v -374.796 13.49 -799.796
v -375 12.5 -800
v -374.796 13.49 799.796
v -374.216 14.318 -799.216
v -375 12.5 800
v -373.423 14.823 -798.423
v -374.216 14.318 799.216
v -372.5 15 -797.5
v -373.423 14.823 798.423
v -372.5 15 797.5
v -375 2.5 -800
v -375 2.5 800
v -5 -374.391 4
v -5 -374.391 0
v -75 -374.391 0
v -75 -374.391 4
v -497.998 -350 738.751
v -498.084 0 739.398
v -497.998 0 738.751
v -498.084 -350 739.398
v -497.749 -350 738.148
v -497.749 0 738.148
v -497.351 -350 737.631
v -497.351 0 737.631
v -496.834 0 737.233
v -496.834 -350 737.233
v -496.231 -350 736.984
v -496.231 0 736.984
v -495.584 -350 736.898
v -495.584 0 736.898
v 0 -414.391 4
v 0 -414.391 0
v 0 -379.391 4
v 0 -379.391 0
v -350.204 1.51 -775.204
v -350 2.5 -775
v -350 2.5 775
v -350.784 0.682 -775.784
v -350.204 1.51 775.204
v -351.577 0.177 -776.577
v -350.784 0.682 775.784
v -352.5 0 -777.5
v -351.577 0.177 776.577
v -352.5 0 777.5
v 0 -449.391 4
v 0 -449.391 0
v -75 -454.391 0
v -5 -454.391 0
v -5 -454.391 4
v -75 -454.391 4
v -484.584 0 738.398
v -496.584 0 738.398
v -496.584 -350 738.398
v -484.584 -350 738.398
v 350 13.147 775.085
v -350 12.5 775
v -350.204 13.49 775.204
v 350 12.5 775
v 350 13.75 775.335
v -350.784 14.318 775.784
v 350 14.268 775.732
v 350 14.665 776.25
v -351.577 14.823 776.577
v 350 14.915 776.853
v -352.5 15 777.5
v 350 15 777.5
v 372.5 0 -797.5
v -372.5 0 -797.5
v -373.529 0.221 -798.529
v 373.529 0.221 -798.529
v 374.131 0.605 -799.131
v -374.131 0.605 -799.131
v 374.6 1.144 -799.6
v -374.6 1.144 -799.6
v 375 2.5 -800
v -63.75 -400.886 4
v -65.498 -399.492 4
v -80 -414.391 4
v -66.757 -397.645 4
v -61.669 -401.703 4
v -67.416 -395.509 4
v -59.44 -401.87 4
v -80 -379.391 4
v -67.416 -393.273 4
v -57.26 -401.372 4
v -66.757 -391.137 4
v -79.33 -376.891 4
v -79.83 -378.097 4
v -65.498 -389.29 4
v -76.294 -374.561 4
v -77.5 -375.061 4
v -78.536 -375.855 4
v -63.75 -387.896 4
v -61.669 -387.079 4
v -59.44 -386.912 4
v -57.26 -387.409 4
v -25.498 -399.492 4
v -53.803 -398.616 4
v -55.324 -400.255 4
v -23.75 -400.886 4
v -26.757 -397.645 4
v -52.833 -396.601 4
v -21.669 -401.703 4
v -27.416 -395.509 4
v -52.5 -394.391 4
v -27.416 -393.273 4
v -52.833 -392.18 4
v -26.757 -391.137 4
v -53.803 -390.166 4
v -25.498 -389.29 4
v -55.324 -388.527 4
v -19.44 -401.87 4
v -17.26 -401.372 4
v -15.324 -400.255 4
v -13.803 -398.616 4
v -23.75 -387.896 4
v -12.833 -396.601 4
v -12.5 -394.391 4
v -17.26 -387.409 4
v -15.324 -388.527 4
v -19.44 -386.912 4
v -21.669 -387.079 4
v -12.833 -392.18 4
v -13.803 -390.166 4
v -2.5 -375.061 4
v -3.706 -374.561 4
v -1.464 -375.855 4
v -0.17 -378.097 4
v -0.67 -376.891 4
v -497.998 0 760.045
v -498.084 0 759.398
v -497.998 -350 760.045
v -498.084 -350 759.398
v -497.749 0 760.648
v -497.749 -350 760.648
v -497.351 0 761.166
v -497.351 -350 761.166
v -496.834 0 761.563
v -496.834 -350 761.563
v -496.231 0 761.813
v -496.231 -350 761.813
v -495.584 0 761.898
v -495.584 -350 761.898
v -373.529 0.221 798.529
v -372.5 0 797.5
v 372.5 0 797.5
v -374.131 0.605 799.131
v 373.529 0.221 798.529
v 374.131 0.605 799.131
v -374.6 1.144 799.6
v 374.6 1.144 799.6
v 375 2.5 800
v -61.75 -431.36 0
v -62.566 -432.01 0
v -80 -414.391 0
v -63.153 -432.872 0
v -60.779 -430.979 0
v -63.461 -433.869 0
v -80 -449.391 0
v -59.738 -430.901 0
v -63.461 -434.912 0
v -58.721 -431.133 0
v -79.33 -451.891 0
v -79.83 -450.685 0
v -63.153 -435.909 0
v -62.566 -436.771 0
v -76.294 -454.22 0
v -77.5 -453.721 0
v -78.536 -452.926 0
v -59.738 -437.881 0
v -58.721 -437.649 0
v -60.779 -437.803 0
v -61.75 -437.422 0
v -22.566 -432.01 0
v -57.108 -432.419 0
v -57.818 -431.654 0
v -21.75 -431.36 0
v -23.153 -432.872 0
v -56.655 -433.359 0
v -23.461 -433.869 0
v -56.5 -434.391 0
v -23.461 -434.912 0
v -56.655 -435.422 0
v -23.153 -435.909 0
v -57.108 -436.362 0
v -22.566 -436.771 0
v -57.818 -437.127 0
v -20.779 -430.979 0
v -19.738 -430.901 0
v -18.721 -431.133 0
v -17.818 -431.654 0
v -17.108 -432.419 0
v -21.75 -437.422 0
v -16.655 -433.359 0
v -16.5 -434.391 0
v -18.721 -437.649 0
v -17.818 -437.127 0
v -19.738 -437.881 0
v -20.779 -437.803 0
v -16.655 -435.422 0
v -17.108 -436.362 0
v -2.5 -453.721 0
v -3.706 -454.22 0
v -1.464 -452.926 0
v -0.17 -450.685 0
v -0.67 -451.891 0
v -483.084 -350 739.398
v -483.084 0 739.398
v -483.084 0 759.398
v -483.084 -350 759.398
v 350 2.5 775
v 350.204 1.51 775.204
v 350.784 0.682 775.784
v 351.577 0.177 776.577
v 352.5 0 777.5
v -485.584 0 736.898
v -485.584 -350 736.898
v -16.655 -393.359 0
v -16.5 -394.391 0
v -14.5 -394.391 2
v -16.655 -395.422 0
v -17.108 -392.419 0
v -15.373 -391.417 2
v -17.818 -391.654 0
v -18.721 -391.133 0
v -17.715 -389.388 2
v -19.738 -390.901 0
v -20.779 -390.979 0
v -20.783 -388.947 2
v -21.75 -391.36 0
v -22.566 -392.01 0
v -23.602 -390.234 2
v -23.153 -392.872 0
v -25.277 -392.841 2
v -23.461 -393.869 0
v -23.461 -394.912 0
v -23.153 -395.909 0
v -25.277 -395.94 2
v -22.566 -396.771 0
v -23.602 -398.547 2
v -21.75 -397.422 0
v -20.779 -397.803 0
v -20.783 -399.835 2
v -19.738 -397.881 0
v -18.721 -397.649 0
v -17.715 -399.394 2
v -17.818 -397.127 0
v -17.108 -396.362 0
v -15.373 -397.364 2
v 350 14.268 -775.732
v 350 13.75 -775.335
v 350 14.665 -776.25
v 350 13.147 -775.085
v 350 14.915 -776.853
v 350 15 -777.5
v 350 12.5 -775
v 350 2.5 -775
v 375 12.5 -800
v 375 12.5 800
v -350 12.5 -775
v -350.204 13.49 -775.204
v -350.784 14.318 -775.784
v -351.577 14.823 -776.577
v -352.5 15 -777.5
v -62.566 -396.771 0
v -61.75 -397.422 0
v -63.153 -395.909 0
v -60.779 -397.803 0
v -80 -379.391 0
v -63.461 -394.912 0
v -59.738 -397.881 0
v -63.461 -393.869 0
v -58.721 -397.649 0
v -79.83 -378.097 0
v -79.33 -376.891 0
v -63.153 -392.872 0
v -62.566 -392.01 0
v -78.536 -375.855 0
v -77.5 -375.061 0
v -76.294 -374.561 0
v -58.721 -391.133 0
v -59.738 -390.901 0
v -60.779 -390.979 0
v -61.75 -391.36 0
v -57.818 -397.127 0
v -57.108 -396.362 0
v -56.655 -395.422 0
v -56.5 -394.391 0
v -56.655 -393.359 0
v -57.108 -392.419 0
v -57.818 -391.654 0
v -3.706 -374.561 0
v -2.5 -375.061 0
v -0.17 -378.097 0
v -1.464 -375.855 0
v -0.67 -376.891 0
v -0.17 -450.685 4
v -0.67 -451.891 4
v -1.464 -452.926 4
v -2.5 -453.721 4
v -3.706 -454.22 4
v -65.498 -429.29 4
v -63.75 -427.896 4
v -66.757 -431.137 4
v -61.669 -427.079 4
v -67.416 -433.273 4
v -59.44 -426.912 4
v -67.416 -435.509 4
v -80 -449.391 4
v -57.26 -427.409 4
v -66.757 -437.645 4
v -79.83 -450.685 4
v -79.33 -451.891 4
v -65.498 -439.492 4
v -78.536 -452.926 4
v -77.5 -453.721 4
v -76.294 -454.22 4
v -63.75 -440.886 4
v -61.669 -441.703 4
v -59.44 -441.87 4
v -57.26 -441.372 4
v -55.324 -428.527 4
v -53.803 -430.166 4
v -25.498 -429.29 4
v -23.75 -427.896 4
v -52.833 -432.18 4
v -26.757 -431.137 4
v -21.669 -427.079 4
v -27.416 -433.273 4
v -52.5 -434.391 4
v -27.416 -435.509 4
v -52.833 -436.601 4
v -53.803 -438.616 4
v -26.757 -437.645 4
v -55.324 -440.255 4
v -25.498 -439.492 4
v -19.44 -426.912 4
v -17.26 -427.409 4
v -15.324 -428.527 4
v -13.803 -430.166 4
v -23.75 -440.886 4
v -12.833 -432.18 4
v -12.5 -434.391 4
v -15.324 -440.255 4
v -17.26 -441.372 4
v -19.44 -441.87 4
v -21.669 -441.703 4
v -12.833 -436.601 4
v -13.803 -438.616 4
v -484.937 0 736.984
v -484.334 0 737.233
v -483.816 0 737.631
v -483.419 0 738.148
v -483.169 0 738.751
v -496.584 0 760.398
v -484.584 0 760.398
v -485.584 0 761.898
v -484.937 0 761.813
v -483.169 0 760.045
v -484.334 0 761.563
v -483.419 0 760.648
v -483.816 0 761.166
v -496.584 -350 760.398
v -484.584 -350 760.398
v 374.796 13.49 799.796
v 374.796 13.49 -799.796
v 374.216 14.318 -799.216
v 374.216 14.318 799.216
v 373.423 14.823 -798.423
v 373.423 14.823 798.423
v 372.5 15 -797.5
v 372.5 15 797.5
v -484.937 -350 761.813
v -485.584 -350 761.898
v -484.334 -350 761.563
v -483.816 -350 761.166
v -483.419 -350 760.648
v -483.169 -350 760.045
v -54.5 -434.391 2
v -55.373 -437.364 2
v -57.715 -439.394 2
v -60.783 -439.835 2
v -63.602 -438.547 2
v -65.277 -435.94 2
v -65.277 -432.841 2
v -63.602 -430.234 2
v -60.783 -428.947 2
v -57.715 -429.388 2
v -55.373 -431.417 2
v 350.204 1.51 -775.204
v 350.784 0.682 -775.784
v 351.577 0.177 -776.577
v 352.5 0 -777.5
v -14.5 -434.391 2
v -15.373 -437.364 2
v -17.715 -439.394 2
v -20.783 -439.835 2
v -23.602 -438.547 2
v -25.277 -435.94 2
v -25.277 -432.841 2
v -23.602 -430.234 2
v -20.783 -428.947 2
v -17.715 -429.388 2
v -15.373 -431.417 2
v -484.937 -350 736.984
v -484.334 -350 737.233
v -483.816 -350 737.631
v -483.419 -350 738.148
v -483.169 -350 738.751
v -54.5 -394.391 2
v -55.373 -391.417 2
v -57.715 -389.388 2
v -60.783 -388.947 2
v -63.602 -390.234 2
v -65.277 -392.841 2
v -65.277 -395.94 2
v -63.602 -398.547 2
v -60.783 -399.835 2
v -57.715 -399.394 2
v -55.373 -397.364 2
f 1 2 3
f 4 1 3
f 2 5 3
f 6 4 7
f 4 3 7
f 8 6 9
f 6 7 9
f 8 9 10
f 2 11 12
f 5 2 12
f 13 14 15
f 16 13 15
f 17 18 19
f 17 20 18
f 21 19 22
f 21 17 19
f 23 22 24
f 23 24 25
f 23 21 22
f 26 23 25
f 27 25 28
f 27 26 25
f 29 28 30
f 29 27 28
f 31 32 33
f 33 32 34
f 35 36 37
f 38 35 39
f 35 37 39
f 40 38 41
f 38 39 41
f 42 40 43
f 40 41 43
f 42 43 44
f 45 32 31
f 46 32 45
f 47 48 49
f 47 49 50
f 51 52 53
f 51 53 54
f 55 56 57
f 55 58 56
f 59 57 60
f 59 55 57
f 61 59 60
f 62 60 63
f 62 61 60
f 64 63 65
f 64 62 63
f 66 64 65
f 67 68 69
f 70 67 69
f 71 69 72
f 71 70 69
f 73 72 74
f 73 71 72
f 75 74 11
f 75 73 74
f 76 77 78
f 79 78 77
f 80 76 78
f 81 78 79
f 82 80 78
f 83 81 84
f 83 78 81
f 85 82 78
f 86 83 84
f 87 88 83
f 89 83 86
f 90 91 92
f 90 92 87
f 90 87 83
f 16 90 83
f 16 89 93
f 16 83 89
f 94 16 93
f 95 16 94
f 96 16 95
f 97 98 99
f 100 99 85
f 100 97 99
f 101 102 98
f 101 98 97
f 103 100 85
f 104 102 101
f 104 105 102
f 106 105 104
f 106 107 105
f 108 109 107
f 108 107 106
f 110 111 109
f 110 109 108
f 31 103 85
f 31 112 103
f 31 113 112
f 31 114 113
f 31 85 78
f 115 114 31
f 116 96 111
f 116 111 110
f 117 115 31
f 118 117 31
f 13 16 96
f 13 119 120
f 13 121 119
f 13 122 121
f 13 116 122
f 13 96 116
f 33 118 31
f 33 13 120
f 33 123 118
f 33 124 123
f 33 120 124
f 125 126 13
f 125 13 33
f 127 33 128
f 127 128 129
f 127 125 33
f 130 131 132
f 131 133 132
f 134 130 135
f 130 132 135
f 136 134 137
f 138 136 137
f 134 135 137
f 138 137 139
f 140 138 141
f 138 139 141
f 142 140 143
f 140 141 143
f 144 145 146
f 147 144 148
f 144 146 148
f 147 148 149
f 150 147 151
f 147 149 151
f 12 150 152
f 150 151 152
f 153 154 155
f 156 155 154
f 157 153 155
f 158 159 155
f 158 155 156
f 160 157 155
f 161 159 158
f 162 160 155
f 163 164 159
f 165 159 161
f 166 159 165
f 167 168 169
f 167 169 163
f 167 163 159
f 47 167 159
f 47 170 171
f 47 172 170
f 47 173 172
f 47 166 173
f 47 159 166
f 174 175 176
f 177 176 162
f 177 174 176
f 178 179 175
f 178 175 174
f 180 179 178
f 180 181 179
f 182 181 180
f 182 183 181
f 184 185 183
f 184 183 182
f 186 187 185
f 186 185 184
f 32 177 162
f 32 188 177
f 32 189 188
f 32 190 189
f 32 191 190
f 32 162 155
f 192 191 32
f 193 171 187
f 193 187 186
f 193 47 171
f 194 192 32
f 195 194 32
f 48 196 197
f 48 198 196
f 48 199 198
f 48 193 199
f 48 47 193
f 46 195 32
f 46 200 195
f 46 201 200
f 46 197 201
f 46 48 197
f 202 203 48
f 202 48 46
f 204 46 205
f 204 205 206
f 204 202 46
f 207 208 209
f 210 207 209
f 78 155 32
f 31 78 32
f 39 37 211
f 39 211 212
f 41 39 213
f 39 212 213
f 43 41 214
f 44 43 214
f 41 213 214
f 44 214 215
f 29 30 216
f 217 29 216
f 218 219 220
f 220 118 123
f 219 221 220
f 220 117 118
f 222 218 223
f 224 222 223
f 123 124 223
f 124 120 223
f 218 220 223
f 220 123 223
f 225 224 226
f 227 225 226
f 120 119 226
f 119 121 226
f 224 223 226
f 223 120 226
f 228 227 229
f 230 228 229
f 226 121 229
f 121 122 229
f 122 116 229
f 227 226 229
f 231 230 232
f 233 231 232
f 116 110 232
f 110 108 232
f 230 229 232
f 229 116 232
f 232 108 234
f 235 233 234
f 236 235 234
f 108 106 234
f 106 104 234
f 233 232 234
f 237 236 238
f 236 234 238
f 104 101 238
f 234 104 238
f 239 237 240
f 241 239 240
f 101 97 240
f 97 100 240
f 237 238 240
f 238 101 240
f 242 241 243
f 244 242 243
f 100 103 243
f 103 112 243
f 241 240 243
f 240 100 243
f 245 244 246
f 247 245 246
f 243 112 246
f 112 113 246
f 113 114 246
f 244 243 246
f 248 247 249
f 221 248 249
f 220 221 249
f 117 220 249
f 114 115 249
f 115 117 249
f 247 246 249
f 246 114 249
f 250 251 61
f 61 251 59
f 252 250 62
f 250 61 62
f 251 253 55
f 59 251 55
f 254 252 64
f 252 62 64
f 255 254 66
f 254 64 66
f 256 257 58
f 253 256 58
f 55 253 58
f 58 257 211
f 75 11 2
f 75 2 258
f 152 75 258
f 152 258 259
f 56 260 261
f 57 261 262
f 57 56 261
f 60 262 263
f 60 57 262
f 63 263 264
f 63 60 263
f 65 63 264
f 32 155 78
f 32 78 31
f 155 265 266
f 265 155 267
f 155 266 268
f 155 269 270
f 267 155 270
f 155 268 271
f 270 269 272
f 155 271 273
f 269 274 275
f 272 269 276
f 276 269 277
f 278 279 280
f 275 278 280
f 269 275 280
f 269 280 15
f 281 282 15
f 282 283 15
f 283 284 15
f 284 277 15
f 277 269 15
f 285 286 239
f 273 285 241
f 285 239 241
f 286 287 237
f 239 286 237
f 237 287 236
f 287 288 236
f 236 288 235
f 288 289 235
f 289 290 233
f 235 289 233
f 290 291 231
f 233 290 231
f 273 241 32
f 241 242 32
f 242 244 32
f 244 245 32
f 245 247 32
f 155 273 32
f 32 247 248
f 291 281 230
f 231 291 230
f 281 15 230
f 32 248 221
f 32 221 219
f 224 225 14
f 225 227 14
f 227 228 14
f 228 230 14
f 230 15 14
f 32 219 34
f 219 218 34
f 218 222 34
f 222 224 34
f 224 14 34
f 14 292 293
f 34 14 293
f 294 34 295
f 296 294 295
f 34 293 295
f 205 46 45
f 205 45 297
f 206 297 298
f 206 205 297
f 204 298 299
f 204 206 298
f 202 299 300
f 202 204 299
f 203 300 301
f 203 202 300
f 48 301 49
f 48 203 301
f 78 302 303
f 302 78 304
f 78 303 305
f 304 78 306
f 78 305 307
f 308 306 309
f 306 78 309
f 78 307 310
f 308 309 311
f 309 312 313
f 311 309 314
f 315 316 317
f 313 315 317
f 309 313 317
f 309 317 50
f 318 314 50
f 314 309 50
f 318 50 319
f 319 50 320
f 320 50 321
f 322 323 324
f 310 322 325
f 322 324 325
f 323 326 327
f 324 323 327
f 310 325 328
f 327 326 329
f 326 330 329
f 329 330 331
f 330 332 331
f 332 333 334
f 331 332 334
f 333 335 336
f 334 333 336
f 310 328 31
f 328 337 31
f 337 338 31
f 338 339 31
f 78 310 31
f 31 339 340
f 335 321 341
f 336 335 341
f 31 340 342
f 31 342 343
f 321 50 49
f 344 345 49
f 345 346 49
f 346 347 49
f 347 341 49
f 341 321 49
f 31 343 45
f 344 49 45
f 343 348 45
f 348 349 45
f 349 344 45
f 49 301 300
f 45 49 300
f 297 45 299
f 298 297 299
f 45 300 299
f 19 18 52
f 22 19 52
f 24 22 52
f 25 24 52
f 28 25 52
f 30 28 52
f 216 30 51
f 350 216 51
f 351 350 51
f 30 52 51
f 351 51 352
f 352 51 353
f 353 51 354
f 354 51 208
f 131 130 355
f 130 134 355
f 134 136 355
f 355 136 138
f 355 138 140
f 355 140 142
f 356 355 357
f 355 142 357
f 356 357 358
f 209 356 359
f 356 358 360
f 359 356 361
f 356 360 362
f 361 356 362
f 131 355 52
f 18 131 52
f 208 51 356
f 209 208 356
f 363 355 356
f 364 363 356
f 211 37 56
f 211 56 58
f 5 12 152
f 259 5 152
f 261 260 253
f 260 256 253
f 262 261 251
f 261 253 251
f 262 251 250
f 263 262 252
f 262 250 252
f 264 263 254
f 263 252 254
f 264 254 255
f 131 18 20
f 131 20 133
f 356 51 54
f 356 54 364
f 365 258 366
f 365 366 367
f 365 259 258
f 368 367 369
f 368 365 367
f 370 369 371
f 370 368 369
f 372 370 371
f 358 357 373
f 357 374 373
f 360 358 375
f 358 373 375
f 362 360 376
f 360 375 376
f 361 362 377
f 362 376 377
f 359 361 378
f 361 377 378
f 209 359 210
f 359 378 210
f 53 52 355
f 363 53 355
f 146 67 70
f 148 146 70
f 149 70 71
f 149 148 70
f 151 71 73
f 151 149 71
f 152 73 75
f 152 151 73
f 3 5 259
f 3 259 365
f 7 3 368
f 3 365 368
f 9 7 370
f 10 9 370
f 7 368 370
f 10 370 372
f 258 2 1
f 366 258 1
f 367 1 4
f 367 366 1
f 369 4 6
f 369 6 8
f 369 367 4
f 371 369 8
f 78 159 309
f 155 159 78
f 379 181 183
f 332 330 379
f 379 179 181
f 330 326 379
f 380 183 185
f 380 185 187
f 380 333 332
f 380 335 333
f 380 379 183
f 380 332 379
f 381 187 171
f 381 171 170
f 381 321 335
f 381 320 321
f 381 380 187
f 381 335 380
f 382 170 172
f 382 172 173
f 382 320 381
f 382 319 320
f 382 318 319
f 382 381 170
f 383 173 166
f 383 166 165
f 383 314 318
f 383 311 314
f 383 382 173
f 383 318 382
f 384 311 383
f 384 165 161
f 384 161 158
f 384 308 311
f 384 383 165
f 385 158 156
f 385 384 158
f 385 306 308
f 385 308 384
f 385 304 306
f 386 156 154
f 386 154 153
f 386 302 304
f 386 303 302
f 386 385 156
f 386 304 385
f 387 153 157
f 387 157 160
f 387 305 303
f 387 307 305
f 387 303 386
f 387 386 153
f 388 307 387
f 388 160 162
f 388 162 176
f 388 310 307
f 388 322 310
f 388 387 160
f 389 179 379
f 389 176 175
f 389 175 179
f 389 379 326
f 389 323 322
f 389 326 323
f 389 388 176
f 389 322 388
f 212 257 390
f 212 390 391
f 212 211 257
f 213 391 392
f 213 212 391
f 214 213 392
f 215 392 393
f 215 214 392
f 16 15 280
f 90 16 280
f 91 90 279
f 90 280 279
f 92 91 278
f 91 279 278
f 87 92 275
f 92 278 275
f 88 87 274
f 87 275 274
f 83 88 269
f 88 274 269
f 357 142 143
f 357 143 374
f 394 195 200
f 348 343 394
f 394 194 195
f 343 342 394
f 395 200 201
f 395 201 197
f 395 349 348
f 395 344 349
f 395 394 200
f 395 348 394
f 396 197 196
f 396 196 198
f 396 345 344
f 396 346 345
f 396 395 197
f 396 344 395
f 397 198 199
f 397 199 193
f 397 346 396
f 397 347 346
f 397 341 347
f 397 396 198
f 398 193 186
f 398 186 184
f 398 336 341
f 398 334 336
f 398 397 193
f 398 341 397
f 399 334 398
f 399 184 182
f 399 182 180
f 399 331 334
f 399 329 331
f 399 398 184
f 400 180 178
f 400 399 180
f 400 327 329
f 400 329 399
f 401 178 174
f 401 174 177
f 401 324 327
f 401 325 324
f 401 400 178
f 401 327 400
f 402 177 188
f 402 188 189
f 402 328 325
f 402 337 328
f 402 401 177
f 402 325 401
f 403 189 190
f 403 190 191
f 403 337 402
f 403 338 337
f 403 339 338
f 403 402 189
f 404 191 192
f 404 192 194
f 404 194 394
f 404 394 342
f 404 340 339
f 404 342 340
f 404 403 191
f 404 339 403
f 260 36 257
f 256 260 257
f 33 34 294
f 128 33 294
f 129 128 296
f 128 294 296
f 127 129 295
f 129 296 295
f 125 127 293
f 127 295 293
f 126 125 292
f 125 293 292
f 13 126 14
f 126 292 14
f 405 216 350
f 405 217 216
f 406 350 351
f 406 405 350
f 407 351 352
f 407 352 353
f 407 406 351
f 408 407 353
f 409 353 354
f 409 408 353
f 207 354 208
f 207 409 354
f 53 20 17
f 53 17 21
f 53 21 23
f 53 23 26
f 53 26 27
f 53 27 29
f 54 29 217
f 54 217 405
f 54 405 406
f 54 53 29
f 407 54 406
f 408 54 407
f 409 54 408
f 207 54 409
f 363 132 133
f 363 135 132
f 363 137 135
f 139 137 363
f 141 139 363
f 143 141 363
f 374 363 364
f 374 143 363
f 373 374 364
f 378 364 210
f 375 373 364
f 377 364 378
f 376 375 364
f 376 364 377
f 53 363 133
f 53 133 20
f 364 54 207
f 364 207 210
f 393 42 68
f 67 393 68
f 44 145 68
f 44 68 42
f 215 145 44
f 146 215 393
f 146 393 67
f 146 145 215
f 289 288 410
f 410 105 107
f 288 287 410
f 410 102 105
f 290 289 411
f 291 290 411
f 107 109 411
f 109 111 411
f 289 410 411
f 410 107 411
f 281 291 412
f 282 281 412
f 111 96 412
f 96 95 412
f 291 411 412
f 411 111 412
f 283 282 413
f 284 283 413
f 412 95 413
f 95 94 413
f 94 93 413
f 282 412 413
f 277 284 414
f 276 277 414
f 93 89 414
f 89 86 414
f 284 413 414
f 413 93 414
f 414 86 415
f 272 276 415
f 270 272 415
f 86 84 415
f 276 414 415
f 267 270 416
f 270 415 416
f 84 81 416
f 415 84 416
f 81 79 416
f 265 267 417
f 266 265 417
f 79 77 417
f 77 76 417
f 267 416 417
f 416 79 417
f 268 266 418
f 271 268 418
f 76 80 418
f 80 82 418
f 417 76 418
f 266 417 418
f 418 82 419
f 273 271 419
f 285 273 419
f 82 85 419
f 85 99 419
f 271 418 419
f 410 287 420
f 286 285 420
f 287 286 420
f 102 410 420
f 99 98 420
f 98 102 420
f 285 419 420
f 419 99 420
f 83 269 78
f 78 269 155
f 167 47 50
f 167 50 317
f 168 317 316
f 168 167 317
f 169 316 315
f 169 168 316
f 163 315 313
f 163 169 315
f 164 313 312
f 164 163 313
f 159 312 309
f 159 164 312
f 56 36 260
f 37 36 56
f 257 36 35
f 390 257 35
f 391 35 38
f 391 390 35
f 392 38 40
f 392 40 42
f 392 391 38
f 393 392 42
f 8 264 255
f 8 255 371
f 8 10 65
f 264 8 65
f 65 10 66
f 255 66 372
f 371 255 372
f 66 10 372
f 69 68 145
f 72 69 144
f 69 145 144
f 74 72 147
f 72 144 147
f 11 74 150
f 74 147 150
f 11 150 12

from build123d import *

# Parameters (mm, degrees)
F0_W     = 750
F0_H     = 1600
F0_W_2   = 700
F0_H_2   = 1550
F1_DEPTH = 15
F2_W     = 15
F2_H     = 25
F2_W_2   = 12
F2_H_2   = 22
F3_DEPTH = 350
F4_R     = 2.5
F5_DEPTH = 4
F8_R     = 2.5
F8_2_R   = 2.5
F9_R     = 2.5


# Not quite as in the source:
# - a fillet or chamfer that OpenCascade refuses, or shapes differently, is made with other operations: its cross-section is extruded or revolved along the edge and cut away or added


with BuildPart() as f1:
    # F0 (on Front) → F1 (new body)
    with BuildSketch(Plane.XZ):
        Rectangle(F0_W, F0_H)
        Rectangle(F0_W_2, F0_H_2, mode=Mode.SUBTRACT)
    extrude(amount=-F1_DEPTH)

    # F8
    f8_edges = [f1.edges().sort_by_distance(p)[0] for p in [
        (-350, 0, 0),
        (0, 0, 775),
        (350, 0, 0),
        (0, 15, -775),
        (0, 0, -775),
        (-350, 15, 0),
        (0, 15, 775),
    ]]
    fillet(f8_edges, radius=F8_R)

    # F9
    f9_edges = [f1.edges().sort_by_distance(p)[0] for p in [
        (-375, 15, 0),
        (-375, 0, 0),
        (0, 15, 800),
        (0, 0, 800),
        (375, 0, 0),
        (375, 15, 0),
        (0, 15, -800),
        (0, 0, -800),
    ]]
    fillet(f9_edges, radius=F9_R)


with BuildPart() as f3:
    # F2 (on face) → F3 (new body)
    with BuildSketch(Plane.XZ):
        with Locations((-490.5836057663, 749.3983626366)):
            Rectangle(F2_W, F2_H)
        with Locations((-490.5836057663, 749.3983626366)):
            Rectangle(F2_W_2, F2_H_2, mode=Mode.SUBTRACT)
    extrude(amount=F3_DEPTH)

    # F8#2
    f8_2_edges = [f3.edges().sort_by_distance(p)[0] for p in [
        (-483.083606, -175, 736.898363),
        (-498.083606, -175, 761.898363),
        (-483.083606, -175, 761.898363),
        (-498.083606, -175, 736.898363),
    ]]
    fillet(f8_2_edges, radius=F8_2_R)


with BuildPart() as f5:
    # F4 (on Top) → F5 (new body)
    with BuildSketch(Plane.XY):
        with BuildLine():
            Line((-5, -374.3908321857), (-75, -374.3908321857))
            ThreePointArc((-75, -374.3908321857), (-78.5355339059, -375.8552982798), (-80, -379.3908321857))
            Line((-80, -379.3908321857), (-80, -414.3908321857))
            Line((-80, -414.3908321857), (0, -414.3908321857))
            Line((0, -414.3908321857), (0, -379.3908321857))
            ThreePointArc((0, -379.3908321857), (-1.4644660941, -375.8552982798), (-5, -374.3908321857))
        make_face()
        with Locations((-60, -394.3908321857)):
            Circle(F4_R, mode=Mode.SUBTRACT)
        with Locations((-20, -394.3908321857)):
            Circle(F4_R, mode=Mode.SUBTRACT)
    extrude(amount=F5_DEPTH)

    # F6: chamfer of 5 on 2 edges, made by hand

    # F6_s1 → F6_t2 (revolve, cut)
    with BuildSketch(Plane.XZ.offset(394.3908321857)):
        Polygon((-17.5, -1), (-12.5, 4), (-17.5, 4), align=None)
    revolve(axis=Axis((-20, -394.3908321857, 4), (0, 0, 1)), mode=Mode.SUBTRACT)

    # F6_s3 → F6_t4 (revolve, cut)
    with BuildSketch(Plane.XZ.offset(394.3908321857)):
        Polygon((-57.5, -1), (-52.5, 4), (-57.5, 4), align=None)
    revolve(axis=Axis((-60, -394.3908321857, 4), (0, 0, 1)), mode=Mode.SUBTRACT)


with BuildPart() as f7_1:
    # F7: instance of F5
    add(f5.part.mirror(Plane(origin=(-40, -414.3908321857, 2), x_dir=(1, 0, 0), z_dir=(0, -1, 0))))


solid = Compound([f1.part, f3.part, f5.part, f7_1.part])
